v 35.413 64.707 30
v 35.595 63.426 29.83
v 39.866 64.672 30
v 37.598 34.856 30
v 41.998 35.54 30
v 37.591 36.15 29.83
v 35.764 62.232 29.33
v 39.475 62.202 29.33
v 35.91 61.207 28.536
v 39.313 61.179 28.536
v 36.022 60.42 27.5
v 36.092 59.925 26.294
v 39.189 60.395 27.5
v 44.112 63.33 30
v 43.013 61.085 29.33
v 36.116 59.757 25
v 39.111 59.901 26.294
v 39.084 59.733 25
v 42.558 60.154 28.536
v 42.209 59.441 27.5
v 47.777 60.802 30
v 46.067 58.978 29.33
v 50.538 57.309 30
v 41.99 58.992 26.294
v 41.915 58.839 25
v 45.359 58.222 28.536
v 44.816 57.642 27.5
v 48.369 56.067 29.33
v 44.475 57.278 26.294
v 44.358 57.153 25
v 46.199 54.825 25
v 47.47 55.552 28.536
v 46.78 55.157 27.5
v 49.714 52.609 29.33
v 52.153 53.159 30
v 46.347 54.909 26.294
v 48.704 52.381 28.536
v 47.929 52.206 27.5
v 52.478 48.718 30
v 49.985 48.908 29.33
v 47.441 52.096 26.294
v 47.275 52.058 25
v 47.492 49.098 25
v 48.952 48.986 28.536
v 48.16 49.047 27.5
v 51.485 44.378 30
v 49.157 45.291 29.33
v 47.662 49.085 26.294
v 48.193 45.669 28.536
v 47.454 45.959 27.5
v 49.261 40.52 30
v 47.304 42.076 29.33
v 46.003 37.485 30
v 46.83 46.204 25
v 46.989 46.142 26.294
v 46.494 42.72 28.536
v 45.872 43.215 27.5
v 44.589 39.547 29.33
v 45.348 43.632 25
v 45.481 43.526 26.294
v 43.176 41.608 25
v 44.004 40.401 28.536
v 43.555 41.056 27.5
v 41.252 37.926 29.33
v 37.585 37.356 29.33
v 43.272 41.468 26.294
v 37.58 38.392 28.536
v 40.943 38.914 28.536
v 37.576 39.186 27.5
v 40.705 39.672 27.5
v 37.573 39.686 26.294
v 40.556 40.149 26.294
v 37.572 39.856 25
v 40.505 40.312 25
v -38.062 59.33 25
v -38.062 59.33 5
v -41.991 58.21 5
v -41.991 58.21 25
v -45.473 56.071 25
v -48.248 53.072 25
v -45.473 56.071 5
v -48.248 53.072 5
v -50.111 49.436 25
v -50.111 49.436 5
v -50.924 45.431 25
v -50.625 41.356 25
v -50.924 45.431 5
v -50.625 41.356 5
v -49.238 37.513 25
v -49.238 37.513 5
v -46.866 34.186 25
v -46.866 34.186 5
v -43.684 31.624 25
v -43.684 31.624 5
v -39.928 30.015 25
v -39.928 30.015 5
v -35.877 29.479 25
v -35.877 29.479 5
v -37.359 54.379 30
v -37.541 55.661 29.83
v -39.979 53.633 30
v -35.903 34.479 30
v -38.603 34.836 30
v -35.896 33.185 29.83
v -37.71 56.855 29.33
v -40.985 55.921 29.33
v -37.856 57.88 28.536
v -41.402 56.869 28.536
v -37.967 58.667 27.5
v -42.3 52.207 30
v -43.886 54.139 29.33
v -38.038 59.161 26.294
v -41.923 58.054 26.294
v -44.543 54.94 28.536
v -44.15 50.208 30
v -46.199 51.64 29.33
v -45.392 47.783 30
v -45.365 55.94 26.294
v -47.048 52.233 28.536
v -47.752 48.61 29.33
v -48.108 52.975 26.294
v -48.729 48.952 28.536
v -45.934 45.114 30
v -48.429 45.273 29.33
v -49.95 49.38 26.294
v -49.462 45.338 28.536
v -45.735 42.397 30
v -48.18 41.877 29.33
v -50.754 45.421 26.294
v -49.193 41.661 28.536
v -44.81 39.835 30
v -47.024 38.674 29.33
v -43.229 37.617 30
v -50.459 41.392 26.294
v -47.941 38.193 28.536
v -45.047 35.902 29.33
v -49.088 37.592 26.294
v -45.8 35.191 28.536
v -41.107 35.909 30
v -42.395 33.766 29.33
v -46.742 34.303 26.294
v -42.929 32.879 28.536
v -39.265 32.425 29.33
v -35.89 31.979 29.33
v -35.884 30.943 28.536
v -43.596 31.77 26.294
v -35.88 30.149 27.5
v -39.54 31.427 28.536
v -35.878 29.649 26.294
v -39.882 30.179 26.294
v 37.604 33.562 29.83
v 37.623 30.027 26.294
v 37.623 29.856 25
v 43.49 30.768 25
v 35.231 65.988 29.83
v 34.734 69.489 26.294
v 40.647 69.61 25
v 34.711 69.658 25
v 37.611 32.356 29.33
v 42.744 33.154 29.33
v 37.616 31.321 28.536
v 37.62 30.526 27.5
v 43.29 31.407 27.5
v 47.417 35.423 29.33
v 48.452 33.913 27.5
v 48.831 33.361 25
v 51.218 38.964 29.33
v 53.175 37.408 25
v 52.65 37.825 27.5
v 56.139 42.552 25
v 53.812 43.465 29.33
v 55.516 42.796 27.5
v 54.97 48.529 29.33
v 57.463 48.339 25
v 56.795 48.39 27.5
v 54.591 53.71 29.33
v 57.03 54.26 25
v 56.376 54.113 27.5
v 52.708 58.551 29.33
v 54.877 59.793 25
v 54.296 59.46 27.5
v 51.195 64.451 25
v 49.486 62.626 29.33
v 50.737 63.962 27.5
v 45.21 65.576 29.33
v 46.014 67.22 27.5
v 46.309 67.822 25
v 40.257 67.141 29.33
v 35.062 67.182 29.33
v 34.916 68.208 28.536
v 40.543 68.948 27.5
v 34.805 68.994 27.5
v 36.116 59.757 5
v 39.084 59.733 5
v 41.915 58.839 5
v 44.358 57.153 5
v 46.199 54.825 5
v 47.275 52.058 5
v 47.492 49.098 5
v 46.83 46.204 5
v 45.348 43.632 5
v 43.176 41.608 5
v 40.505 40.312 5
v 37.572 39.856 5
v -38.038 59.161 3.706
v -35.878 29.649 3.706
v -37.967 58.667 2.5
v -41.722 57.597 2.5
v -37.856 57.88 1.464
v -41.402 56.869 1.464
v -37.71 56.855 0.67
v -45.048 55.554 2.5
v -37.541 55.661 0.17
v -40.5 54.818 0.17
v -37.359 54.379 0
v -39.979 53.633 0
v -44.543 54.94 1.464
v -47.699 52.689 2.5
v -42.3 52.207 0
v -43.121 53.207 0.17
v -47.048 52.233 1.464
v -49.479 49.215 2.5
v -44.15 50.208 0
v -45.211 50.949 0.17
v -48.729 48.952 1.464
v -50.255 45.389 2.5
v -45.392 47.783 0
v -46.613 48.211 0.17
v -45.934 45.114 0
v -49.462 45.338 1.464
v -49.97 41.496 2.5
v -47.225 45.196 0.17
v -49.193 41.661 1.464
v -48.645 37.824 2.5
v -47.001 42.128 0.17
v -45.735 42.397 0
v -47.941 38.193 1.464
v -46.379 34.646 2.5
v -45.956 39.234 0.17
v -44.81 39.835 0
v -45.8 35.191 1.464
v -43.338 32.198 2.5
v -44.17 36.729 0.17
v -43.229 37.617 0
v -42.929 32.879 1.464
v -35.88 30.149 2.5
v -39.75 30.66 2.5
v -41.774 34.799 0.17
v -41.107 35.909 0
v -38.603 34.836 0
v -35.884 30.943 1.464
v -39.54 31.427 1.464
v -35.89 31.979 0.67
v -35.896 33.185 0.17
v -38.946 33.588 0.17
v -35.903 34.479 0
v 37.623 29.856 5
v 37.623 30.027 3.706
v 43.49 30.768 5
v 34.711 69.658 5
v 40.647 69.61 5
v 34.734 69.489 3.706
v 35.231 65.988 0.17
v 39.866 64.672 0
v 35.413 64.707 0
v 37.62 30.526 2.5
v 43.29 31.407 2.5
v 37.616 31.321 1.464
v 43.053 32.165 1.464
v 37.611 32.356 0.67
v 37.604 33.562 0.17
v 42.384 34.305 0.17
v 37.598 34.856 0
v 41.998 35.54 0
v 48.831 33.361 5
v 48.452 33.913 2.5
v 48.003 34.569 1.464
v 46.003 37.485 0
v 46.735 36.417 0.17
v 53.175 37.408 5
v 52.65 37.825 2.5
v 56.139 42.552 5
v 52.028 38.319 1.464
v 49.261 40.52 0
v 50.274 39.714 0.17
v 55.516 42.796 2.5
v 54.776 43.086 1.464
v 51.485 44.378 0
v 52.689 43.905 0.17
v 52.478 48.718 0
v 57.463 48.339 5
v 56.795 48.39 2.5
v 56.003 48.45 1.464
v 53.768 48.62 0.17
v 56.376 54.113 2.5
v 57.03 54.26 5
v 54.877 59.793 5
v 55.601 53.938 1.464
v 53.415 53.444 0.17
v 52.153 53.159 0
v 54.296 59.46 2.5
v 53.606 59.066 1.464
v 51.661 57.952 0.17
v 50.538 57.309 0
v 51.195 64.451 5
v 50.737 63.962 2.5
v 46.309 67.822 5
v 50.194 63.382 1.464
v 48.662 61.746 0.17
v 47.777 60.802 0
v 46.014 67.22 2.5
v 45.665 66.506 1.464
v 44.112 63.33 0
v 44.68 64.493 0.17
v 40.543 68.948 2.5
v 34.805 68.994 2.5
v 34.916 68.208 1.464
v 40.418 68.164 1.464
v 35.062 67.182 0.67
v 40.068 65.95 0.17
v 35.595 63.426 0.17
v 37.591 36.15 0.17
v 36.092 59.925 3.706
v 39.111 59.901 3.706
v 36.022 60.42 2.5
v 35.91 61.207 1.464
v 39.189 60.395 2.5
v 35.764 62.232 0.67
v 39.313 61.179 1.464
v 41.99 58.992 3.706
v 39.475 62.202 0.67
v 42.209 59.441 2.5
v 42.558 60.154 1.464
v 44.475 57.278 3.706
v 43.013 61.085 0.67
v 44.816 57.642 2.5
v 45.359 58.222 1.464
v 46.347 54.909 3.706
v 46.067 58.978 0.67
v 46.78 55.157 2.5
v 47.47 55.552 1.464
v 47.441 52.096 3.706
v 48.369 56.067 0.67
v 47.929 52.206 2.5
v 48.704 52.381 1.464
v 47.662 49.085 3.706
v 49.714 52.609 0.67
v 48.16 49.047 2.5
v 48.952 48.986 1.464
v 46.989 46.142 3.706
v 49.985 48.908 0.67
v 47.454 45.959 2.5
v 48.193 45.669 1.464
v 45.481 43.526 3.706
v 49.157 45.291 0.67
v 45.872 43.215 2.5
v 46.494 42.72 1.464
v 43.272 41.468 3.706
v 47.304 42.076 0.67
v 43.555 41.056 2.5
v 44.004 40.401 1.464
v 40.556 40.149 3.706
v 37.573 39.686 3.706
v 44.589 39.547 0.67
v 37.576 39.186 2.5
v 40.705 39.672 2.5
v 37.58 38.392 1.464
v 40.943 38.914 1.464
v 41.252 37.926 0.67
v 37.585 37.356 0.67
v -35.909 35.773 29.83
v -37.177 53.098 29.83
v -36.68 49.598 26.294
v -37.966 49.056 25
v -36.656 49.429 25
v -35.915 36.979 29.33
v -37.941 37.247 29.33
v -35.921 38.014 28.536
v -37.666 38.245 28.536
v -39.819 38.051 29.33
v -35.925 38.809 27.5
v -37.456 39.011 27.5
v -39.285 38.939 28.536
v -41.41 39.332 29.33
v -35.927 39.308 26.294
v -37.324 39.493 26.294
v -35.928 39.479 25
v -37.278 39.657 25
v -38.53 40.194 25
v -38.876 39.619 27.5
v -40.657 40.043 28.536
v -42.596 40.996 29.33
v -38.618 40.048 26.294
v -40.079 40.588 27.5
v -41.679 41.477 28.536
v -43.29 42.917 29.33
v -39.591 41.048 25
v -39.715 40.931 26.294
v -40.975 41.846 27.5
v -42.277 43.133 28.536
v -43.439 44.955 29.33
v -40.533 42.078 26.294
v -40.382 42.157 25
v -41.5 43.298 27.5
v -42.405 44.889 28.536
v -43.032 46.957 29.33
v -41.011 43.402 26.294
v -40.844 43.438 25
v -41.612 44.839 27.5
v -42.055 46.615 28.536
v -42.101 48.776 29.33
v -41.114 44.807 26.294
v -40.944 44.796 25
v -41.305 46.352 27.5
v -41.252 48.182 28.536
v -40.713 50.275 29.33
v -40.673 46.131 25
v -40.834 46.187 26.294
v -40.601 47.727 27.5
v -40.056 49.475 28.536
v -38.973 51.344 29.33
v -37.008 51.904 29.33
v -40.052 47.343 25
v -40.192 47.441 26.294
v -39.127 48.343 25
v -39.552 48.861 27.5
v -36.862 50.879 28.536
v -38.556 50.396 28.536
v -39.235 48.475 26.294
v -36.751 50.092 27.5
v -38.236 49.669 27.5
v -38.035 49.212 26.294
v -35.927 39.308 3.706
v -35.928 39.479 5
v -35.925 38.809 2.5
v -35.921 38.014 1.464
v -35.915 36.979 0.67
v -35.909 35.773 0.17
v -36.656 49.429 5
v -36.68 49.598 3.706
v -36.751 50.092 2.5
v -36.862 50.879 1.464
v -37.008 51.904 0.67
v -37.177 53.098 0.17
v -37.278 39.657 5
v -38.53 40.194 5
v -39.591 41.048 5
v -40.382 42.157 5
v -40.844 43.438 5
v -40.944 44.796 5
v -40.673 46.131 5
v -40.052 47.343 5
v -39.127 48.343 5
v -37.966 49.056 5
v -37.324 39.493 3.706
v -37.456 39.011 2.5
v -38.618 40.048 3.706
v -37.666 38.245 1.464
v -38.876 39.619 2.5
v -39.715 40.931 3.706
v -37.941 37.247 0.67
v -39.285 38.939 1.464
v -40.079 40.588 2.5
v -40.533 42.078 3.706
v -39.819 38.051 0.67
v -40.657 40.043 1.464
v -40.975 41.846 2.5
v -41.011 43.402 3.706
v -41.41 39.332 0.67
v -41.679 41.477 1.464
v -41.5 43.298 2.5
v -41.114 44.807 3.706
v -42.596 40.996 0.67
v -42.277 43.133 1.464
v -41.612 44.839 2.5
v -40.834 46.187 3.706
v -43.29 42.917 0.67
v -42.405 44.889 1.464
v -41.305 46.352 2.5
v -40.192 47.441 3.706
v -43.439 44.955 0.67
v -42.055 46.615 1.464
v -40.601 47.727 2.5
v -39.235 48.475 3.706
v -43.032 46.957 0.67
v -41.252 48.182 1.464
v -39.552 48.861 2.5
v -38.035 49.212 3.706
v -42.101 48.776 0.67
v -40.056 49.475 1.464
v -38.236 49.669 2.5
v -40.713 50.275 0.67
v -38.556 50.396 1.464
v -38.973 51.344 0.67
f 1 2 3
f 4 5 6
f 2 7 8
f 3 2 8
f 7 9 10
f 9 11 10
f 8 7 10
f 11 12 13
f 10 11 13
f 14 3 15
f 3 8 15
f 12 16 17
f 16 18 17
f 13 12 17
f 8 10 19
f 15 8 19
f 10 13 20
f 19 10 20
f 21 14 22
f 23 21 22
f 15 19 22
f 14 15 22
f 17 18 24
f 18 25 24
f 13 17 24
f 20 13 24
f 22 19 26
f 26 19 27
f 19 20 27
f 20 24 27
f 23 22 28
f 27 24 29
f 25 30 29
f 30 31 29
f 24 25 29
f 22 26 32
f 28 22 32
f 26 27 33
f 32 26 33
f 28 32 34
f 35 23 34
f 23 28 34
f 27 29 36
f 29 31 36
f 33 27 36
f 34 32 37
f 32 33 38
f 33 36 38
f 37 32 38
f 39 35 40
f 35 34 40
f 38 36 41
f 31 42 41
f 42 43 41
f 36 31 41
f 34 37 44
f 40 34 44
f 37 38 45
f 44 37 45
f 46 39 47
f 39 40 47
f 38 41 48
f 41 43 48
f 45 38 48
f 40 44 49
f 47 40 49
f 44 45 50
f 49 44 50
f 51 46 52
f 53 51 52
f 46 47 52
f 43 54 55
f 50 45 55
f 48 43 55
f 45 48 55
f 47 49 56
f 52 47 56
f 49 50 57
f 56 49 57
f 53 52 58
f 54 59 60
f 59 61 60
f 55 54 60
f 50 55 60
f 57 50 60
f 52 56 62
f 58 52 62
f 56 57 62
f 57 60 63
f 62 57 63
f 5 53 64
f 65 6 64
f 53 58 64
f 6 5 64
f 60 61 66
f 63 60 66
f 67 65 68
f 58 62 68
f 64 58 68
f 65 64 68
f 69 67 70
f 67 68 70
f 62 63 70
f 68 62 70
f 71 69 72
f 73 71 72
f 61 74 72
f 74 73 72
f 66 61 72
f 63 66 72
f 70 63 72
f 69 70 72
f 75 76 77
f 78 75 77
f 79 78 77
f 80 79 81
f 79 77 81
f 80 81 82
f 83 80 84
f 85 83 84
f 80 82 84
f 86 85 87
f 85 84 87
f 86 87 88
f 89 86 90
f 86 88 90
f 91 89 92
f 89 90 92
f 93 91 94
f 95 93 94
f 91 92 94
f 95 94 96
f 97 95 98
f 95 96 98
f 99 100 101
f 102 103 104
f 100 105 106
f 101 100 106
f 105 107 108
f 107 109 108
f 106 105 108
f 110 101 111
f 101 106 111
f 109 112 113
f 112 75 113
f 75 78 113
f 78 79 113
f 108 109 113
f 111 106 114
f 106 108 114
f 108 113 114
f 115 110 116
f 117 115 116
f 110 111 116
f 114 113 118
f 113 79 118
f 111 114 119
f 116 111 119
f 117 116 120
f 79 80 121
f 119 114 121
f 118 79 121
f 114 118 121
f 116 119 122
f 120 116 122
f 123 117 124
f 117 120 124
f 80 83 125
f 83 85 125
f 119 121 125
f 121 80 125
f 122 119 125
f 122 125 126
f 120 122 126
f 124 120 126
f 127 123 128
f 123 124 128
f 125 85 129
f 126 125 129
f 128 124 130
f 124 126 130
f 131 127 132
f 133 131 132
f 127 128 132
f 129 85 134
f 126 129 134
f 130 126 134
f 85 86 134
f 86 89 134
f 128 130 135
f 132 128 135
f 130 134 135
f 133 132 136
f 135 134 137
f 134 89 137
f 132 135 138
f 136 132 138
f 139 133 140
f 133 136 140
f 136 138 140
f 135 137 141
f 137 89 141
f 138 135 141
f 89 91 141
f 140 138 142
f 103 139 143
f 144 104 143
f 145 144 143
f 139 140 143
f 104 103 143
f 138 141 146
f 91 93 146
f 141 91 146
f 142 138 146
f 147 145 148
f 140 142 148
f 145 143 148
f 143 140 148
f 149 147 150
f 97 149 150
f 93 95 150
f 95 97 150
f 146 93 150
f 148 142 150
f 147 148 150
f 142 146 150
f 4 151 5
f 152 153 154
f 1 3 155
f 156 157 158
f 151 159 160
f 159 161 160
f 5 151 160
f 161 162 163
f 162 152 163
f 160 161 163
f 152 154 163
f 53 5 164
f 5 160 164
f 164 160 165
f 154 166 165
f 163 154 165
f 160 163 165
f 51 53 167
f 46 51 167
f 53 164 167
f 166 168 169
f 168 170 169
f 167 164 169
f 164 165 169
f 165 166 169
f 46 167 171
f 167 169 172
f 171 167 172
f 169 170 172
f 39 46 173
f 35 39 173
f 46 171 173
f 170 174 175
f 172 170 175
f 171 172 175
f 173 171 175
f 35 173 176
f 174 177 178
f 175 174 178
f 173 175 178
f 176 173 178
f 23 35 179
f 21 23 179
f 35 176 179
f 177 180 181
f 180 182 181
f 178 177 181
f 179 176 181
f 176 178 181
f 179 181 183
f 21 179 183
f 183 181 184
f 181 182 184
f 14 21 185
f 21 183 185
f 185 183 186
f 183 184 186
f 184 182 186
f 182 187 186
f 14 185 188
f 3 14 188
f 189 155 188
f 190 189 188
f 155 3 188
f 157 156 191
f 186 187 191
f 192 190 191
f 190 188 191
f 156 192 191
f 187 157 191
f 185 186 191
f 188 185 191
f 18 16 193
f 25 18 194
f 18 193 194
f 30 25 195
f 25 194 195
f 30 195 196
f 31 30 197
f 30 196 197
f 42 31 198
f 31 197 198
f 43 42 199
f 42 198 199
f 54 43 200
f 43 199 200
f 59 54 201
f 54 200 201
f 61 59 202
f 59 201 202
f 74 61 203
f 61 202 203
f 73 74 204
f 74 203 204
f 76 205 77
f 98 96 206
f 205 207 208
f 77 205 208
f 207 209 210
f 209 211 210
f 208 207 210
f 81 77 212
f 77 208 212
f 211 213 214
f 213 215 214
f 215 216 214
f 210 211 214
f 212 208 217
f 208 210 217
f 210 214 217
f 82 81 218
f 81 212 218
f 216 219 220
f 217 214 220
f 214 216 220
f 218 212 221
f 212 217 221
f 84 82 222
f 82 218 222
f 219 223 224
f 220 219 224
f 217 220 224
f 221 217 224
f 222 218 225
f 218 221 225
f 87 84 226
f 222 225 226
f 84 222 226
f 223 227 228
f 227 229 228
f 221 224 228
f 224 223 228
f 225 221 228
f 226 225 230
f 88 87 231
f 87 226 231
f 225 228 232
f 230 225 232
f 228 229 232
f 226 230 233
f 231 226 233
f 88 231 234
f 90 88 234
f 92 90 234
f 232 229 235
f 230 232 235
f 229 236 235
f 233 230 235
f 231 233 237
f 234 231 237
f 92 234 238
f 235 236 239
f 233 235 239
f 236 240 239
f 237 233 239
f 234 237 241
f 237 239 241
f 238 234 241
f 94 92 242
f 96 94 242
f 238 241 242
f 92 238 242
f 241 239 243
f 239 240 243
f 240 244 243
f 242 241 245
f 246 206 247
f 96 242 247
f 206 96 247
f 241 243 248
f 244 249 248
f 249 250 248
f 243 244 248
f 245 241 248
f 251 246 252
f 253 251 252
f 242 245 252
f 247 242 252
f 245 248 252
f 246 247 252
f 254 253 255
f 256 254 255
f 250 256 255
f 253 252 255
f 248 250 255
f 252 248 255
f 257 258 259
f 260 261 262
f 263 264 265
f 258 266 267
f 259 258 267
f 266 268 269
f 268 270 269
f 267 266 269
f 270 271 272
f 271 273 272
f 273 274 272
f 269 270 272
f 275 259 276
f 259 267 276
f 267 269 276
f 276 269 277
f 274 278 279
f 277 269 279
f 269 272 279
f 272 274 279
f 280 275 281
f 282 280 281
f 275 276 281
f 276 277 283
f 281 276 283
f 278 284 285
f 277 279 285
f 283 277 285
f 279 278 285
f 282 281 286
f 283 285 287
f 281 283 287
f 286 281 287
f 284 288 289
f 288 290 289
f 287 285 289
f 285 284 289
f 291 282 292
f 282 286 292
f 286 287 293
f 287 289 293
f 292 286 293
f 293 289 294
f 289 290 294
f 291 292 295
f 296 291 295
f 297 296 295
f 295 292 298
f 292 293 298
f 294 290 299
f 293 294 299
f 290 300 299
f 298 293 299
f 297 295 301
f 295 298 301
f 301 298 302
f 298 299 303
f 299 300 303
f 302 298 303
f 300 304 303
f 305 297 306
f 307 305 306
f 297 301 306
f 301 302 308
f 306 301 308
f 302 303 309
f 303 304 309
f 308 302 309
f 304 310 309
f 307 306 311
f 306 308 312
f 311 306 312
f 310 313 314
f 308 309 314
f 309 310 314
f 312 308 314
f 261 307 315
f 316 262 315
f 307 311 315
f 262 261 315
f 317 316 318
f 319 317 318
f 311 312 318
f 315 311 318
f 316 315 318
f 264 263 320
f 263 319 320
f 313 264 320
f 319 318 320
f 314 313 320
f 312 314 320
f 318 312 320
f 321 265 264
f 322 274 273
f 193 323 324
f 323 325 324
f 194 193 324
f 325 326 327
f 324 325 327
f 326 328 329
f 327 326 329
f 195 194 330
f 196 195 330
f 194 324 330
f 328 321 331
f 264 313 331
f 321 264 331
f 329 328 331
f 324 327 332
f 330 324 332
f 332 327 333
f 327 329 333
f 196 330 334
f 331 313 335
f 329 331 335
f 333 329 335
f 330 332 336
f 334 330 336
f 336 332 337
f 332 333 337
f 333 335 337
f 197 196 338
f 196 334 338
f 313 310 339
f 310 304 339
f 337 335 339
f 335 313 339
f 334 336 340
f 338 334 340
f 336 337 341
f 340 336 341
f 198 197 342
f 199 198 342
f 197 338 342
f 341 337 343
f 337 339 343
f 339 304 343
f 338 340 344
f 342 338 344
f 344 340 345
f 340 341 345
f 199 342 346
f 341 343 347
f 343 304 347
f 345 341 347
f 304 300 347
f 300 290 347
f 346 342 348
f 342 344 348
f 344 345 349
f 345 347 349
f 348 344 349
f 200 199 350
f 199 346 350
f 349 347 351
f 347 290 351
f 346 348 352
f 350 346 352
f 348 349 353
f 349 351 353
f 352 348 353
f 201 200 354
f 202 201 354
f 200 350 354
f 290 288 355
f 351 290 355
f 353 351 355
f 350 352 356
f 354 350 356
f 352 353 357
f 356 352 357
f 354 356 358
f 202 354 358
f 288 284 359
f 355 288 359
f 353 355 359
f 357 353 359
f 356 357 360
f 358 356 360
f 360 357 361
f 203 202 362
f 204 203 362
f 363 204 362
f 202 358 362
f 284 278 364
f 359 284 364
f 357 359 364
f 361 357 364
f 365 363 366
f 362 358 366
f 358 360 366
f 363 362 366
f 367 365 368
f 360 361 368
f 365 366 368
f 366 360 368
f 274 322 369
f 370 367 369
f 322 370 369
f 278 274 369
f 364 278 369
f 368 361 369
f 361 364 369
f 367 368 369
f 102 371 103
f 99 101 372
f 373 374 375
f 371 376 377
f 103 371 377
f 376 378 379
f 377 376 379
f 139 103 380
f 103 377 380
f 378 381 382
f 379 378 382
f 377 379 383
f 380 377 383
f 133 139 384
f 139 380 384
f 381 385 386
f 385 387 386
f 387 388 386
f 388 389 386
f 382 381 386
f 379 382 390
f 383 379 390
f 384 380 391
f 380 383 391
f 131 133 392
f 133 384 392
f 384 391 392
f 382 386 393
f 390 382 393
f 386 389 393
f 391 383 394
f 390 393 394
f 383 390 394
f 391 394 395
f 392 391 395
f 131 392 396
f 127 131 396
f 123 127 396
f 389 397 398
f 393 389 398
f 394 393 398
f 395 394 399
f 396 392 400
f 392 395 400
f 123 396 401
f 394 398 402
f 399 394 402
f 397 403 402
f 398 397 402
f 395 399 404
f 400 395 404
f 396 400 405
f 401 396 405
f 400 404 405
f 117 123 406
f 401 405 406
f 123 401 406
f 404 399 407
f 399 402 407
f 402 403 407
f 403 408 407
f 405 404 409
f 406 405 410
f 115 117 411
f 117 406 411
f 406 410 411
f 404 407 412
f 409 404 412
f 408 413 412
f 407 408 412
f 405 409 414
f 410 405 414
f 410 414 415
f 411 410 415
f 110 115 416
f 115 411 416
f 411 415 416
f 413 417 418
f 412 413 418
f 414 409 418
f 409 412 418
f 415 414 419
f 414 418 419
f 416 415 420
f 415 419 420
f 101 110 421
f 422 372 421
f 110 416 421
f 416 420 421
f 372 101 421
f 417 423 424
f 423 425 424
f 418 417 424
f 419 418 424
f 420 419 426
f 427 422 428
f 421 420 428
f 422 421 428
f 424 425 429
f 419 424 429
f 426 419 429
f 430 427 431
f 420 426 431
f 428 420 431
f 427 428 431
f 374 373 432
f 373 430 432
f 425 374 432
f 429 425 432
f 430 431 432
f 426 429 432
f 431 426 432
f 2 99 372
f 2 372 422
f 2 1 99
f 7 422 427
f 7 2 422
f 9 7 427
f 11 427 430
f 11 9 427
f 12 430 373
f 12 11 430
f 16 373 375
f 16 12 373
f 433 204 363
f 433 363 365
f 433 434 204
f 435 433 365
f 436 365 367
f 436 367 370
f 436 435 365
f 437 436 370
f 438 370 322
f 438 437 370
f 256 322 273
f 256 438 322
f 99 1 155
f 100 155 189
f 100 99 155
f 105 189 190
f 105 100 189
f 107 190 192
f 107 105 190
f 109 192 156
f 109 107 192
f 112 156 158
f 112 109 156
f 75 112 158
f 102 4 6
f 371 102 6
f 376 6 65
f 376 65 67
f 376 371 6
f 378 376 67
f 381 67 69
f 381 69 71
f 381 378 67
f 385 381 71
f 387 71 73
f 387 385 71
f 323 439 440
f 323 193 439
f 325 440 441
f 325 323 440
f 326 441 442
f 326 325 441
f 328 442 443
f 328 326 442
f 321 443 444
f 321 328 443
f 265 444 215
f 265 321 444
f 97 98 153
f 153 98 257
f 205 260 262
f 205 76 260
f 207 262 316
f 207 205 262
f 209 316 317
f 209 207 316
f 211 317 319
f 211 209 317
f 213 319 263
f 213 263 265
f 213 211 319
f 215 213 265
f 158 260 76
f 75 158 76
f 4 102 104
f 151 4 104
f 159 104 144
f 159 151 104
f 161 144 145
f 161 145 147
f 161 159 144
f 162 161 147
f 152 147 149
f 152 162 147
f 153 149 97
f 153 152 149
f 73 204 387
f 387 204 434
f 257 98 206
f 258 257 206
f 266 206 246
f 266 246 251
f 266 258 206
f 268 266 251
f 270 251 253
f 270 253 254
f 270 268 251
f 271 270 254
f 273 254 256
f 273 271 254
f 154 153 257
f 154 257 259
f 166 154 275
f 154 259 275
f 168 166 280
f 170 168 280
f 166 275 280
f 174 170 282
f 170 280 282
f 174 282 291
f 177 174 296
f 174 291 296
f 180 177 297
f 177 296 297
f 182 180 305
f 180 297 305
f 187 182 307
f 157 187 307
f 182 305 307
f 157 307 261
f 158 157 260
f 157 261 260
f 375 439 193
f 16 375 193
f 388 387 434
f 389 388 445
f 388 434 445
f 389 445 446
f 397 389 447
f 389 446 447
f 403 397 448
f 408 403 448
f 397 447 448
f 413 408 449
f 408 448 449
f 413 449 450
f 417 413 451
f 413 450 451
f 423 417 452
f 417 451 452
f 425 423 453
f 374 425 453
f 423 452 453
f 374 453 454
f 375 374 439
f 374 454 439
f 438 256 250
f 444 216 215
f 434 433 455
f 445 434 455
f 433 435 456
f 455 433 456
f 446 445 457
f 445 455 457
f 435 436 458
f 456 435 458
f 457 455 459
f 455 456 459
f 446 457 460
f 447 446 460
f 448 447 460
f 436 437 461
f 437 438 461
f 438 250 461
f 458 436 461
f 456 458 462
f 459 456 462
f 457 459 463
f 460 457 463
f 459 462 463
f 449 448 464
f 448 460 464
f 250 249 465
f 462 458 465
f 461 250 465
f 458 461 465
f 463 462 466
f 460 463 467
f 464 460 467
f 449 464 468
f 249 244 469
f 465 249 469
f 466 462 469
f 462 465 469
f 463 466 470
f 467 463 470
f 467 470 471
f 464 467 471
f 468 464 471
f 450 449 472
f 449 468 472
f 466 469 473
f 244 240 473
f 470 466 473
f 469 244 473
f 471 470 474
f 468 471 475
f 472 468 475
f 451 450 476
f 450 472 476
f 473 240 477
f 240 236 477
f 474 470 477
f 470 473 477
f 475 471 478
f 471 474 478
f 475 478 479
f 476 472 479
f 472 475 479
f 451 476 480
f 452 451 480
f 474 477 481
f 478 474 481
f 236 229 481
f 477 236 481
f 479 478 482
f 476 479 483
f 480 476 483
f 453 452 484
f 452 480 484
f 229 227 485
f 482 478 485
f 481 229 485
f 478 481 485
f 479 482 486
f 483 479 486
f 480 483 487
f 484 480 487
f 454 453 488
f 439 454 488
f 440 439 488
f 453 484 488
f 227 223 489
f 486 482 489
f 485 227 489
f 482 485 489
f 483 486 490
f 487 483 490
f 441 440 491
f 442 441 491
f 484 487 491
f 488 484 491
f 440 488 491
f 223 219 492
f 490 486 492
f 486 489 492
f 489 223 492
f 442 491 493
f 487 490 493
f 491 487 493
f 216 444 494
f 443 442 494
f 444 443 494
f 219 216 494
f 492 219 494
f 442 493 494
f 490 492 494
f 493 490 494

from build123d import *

# Parameters (mm, degrees)
F1_DEPTH = 30
F2_DEPTH = 25.4
F3_R     = 4.99999


# Not quite as in the source:
# - a fillet or chamfer is up to 0.001 mm smaller than in the source, because OpenCascade refuses the exact size


with BuildPart() as f1:
    # F0 (on Top) → F1 (new body)
    with BuildSketch(Plane.XY):
        with BuildLine():
            Line((34.7105600204, 69.6575524111), (-38.0615795526, 59.3297830847))
            ThreePointArc((-38.0615795526, 59.3297830847), (-50.9138983938, 43.3837240922), (-35.8768828371, 29.4787947456))
            Line((-35.8768828371, 29.4787947456), (37.6234889744, 29.8562346256))
            ThreePointArc((37.6234889744, 29.8562346256), (57.4674373389, 51.3158014327), (34.7105600204, 69.6575524111))
        make_face()
        with BuildLine():
            ThreePointArc((36.1156730696, 59.756761669), (47.4941117288, 50.5858861798), (37.5721375466, 39.8561027762))
            Line((37.5721375466, 39.8561027762), (-35.9282342649, 39.4786628962))
            ThreePointArc((-35.9282342649, 39.4786628962), (-40.9405727838, 44.1136393451), (-36.6564665034, 49.4289923426))
            Line((-36.6564665034, 49.4289923426), (36.1156730696, 59.756761669))
        make_face(mode=Mode.SUBTRACT)
    extrude(amount=F1_DEPTH)

    # F0 (on Top) → F2 (join)
    with BuildSketch(Plane.XY):
        with BuildLine():
            Line((34.7105600204, 69.6575524111), (-38.0615795526, 59.3297830847))
            ThreePointArc((-38.0615795526, 59.3297830847), (-50.9138983938, 43.3837240922), (-35.8768828371, 29.4787947456))
            Line((-35.8768828371, 29.4787947456), (37.6234889744, 29.8562346256))
            ThreePointArc((37.6234889744, 29.8562346256), (57.4674373389, 51.3158014327), (34.7105600204, 69.6575524111))
        make_face()
        with BuildLine():
            ThreePointArc((36.1156730696, 59.756761669), (47.4941117288, 50.5858861798), (37.5721375466, 39.8561027762))
            Line((37.5721375466, 39.8561027762), (-35.9282342649, 39.4786628962))
            ThreePointArc((-35.9282342649, 39.4786628962), (-40.9405727838, 44.1136393451), (-36.6564665034, 49.4289923426))
            Line((-36.6564665034, 49.4289923426), (36.1156730696, 59.756761669))
        make_face(mode=Mode.SUBTRACT)
    extrude(amount=F2_DEPTH)

    # F3 (radius 5 in the source; OpenCascade refuses exactly that, so slightly less here)
    f3_edges = [f1.edges().sort_by_distance(p)[0] for p in [
        (57.467437, 51.315801, 30),
        (-1.67551, 64.493668, 30),
        (-50.913898, 43.383724, 30),
        (0.873303, 29.667515, 30),
        (-40.940573, 44.113639, 30),
        (-0.270397, 54.592877, 30),
        (47.494112, 50.585886, 30),
        (0.821952, 39.667383, 30),
        (57.467437, 51.315801, 0),
        (-1.67551, 64.493668, 0),
        (-50.913898, 43.383724, 0),
        (0.873303, 29.667515, 0),
        (-40.940573, 44.113639, 0),
        (-0.270397, 54.592877, 0),
        (47.494112, 50.585886, 0),
        (0.821952, 39.667383, 0),
    ]]
    fillet(f3_edges, radius=F3_R)


solid = f1.part
